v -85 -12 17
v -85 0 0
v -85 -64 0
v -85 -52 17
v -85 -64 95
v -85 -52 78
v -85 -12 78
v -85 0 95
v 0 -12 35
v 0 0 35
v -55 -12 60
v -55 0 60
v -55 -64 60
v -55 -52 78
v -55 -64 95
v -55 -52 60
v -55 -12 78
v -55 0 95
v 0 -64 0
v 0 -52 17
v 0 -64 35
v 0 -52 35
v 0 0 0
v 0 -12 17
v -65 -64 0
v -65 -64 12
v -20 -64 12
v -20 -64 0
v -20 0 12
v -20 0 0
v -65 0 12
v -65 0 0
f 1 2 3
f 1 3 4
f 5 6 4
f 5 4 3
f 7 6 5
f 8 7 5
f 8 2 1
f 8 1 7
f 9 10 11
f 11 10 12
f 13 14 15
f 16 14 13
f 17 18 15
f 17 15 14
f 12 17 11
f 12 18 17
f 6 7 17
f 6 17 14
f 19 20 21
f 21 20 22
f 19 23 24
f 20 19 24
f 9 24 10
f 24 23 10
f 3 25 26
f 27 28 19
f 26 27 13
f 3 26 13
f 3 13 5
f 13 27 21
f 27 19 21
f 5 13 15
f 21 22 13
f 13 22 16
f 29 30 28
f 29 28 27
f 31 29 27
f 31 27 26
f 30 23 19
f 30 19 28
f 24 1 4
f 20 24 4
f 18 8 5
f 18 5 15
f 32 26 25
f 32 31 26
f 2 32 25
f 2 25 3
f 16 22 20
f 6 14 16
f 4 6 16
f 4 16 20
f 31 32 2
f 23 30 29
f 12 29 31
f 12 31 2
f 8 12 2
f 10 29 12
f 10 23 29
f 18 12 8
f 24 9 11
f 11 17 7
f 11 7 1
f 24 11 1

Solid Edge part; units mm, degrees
sketch "Sketch1" plane through (0, 0, 0) normal (0, -1, 0) x (1, 0, 0)
  line L0 (0, 0) -> (-20, 0)
  line L1 (-20, 0) -> (-20, 12)
  line L2 (-20, 12) -> (-65, 12)
  line L3 (-65, 12) -> (-65, 0)
  line L4 (-65, 0) -> (-85, 0)
  line L5 (-85, 0) -> (-85, 95)
  line L6 (-85, 95) -> (-55, 95)
  line L7 (-55, 95) -> (-55, 60)
  line L8 (0, 35) -> (-55, 60)
  line L9 (0, 0) -> (0, 35)
extrude "ProtrusiónExtruida_1" add sketch "Sketch1" along normal blind 64
sketch "Sketch2" plane through (-85, -32, 47.5) normal (-1, 0, 0) x (0, -1, 0)
  line L0 (-20, 30.5) -> (20, 30.5)
  line L1 (20, 30.5) -> (20, -30.5)
  line L2 (-20, -30.5) -> (20, -30.5)
  line L3 (-20, 30.5) -> (-20, -30.5)
extrude "VaciadoExtruido_1" cut sketch "Sketch2" against normal blind 85
